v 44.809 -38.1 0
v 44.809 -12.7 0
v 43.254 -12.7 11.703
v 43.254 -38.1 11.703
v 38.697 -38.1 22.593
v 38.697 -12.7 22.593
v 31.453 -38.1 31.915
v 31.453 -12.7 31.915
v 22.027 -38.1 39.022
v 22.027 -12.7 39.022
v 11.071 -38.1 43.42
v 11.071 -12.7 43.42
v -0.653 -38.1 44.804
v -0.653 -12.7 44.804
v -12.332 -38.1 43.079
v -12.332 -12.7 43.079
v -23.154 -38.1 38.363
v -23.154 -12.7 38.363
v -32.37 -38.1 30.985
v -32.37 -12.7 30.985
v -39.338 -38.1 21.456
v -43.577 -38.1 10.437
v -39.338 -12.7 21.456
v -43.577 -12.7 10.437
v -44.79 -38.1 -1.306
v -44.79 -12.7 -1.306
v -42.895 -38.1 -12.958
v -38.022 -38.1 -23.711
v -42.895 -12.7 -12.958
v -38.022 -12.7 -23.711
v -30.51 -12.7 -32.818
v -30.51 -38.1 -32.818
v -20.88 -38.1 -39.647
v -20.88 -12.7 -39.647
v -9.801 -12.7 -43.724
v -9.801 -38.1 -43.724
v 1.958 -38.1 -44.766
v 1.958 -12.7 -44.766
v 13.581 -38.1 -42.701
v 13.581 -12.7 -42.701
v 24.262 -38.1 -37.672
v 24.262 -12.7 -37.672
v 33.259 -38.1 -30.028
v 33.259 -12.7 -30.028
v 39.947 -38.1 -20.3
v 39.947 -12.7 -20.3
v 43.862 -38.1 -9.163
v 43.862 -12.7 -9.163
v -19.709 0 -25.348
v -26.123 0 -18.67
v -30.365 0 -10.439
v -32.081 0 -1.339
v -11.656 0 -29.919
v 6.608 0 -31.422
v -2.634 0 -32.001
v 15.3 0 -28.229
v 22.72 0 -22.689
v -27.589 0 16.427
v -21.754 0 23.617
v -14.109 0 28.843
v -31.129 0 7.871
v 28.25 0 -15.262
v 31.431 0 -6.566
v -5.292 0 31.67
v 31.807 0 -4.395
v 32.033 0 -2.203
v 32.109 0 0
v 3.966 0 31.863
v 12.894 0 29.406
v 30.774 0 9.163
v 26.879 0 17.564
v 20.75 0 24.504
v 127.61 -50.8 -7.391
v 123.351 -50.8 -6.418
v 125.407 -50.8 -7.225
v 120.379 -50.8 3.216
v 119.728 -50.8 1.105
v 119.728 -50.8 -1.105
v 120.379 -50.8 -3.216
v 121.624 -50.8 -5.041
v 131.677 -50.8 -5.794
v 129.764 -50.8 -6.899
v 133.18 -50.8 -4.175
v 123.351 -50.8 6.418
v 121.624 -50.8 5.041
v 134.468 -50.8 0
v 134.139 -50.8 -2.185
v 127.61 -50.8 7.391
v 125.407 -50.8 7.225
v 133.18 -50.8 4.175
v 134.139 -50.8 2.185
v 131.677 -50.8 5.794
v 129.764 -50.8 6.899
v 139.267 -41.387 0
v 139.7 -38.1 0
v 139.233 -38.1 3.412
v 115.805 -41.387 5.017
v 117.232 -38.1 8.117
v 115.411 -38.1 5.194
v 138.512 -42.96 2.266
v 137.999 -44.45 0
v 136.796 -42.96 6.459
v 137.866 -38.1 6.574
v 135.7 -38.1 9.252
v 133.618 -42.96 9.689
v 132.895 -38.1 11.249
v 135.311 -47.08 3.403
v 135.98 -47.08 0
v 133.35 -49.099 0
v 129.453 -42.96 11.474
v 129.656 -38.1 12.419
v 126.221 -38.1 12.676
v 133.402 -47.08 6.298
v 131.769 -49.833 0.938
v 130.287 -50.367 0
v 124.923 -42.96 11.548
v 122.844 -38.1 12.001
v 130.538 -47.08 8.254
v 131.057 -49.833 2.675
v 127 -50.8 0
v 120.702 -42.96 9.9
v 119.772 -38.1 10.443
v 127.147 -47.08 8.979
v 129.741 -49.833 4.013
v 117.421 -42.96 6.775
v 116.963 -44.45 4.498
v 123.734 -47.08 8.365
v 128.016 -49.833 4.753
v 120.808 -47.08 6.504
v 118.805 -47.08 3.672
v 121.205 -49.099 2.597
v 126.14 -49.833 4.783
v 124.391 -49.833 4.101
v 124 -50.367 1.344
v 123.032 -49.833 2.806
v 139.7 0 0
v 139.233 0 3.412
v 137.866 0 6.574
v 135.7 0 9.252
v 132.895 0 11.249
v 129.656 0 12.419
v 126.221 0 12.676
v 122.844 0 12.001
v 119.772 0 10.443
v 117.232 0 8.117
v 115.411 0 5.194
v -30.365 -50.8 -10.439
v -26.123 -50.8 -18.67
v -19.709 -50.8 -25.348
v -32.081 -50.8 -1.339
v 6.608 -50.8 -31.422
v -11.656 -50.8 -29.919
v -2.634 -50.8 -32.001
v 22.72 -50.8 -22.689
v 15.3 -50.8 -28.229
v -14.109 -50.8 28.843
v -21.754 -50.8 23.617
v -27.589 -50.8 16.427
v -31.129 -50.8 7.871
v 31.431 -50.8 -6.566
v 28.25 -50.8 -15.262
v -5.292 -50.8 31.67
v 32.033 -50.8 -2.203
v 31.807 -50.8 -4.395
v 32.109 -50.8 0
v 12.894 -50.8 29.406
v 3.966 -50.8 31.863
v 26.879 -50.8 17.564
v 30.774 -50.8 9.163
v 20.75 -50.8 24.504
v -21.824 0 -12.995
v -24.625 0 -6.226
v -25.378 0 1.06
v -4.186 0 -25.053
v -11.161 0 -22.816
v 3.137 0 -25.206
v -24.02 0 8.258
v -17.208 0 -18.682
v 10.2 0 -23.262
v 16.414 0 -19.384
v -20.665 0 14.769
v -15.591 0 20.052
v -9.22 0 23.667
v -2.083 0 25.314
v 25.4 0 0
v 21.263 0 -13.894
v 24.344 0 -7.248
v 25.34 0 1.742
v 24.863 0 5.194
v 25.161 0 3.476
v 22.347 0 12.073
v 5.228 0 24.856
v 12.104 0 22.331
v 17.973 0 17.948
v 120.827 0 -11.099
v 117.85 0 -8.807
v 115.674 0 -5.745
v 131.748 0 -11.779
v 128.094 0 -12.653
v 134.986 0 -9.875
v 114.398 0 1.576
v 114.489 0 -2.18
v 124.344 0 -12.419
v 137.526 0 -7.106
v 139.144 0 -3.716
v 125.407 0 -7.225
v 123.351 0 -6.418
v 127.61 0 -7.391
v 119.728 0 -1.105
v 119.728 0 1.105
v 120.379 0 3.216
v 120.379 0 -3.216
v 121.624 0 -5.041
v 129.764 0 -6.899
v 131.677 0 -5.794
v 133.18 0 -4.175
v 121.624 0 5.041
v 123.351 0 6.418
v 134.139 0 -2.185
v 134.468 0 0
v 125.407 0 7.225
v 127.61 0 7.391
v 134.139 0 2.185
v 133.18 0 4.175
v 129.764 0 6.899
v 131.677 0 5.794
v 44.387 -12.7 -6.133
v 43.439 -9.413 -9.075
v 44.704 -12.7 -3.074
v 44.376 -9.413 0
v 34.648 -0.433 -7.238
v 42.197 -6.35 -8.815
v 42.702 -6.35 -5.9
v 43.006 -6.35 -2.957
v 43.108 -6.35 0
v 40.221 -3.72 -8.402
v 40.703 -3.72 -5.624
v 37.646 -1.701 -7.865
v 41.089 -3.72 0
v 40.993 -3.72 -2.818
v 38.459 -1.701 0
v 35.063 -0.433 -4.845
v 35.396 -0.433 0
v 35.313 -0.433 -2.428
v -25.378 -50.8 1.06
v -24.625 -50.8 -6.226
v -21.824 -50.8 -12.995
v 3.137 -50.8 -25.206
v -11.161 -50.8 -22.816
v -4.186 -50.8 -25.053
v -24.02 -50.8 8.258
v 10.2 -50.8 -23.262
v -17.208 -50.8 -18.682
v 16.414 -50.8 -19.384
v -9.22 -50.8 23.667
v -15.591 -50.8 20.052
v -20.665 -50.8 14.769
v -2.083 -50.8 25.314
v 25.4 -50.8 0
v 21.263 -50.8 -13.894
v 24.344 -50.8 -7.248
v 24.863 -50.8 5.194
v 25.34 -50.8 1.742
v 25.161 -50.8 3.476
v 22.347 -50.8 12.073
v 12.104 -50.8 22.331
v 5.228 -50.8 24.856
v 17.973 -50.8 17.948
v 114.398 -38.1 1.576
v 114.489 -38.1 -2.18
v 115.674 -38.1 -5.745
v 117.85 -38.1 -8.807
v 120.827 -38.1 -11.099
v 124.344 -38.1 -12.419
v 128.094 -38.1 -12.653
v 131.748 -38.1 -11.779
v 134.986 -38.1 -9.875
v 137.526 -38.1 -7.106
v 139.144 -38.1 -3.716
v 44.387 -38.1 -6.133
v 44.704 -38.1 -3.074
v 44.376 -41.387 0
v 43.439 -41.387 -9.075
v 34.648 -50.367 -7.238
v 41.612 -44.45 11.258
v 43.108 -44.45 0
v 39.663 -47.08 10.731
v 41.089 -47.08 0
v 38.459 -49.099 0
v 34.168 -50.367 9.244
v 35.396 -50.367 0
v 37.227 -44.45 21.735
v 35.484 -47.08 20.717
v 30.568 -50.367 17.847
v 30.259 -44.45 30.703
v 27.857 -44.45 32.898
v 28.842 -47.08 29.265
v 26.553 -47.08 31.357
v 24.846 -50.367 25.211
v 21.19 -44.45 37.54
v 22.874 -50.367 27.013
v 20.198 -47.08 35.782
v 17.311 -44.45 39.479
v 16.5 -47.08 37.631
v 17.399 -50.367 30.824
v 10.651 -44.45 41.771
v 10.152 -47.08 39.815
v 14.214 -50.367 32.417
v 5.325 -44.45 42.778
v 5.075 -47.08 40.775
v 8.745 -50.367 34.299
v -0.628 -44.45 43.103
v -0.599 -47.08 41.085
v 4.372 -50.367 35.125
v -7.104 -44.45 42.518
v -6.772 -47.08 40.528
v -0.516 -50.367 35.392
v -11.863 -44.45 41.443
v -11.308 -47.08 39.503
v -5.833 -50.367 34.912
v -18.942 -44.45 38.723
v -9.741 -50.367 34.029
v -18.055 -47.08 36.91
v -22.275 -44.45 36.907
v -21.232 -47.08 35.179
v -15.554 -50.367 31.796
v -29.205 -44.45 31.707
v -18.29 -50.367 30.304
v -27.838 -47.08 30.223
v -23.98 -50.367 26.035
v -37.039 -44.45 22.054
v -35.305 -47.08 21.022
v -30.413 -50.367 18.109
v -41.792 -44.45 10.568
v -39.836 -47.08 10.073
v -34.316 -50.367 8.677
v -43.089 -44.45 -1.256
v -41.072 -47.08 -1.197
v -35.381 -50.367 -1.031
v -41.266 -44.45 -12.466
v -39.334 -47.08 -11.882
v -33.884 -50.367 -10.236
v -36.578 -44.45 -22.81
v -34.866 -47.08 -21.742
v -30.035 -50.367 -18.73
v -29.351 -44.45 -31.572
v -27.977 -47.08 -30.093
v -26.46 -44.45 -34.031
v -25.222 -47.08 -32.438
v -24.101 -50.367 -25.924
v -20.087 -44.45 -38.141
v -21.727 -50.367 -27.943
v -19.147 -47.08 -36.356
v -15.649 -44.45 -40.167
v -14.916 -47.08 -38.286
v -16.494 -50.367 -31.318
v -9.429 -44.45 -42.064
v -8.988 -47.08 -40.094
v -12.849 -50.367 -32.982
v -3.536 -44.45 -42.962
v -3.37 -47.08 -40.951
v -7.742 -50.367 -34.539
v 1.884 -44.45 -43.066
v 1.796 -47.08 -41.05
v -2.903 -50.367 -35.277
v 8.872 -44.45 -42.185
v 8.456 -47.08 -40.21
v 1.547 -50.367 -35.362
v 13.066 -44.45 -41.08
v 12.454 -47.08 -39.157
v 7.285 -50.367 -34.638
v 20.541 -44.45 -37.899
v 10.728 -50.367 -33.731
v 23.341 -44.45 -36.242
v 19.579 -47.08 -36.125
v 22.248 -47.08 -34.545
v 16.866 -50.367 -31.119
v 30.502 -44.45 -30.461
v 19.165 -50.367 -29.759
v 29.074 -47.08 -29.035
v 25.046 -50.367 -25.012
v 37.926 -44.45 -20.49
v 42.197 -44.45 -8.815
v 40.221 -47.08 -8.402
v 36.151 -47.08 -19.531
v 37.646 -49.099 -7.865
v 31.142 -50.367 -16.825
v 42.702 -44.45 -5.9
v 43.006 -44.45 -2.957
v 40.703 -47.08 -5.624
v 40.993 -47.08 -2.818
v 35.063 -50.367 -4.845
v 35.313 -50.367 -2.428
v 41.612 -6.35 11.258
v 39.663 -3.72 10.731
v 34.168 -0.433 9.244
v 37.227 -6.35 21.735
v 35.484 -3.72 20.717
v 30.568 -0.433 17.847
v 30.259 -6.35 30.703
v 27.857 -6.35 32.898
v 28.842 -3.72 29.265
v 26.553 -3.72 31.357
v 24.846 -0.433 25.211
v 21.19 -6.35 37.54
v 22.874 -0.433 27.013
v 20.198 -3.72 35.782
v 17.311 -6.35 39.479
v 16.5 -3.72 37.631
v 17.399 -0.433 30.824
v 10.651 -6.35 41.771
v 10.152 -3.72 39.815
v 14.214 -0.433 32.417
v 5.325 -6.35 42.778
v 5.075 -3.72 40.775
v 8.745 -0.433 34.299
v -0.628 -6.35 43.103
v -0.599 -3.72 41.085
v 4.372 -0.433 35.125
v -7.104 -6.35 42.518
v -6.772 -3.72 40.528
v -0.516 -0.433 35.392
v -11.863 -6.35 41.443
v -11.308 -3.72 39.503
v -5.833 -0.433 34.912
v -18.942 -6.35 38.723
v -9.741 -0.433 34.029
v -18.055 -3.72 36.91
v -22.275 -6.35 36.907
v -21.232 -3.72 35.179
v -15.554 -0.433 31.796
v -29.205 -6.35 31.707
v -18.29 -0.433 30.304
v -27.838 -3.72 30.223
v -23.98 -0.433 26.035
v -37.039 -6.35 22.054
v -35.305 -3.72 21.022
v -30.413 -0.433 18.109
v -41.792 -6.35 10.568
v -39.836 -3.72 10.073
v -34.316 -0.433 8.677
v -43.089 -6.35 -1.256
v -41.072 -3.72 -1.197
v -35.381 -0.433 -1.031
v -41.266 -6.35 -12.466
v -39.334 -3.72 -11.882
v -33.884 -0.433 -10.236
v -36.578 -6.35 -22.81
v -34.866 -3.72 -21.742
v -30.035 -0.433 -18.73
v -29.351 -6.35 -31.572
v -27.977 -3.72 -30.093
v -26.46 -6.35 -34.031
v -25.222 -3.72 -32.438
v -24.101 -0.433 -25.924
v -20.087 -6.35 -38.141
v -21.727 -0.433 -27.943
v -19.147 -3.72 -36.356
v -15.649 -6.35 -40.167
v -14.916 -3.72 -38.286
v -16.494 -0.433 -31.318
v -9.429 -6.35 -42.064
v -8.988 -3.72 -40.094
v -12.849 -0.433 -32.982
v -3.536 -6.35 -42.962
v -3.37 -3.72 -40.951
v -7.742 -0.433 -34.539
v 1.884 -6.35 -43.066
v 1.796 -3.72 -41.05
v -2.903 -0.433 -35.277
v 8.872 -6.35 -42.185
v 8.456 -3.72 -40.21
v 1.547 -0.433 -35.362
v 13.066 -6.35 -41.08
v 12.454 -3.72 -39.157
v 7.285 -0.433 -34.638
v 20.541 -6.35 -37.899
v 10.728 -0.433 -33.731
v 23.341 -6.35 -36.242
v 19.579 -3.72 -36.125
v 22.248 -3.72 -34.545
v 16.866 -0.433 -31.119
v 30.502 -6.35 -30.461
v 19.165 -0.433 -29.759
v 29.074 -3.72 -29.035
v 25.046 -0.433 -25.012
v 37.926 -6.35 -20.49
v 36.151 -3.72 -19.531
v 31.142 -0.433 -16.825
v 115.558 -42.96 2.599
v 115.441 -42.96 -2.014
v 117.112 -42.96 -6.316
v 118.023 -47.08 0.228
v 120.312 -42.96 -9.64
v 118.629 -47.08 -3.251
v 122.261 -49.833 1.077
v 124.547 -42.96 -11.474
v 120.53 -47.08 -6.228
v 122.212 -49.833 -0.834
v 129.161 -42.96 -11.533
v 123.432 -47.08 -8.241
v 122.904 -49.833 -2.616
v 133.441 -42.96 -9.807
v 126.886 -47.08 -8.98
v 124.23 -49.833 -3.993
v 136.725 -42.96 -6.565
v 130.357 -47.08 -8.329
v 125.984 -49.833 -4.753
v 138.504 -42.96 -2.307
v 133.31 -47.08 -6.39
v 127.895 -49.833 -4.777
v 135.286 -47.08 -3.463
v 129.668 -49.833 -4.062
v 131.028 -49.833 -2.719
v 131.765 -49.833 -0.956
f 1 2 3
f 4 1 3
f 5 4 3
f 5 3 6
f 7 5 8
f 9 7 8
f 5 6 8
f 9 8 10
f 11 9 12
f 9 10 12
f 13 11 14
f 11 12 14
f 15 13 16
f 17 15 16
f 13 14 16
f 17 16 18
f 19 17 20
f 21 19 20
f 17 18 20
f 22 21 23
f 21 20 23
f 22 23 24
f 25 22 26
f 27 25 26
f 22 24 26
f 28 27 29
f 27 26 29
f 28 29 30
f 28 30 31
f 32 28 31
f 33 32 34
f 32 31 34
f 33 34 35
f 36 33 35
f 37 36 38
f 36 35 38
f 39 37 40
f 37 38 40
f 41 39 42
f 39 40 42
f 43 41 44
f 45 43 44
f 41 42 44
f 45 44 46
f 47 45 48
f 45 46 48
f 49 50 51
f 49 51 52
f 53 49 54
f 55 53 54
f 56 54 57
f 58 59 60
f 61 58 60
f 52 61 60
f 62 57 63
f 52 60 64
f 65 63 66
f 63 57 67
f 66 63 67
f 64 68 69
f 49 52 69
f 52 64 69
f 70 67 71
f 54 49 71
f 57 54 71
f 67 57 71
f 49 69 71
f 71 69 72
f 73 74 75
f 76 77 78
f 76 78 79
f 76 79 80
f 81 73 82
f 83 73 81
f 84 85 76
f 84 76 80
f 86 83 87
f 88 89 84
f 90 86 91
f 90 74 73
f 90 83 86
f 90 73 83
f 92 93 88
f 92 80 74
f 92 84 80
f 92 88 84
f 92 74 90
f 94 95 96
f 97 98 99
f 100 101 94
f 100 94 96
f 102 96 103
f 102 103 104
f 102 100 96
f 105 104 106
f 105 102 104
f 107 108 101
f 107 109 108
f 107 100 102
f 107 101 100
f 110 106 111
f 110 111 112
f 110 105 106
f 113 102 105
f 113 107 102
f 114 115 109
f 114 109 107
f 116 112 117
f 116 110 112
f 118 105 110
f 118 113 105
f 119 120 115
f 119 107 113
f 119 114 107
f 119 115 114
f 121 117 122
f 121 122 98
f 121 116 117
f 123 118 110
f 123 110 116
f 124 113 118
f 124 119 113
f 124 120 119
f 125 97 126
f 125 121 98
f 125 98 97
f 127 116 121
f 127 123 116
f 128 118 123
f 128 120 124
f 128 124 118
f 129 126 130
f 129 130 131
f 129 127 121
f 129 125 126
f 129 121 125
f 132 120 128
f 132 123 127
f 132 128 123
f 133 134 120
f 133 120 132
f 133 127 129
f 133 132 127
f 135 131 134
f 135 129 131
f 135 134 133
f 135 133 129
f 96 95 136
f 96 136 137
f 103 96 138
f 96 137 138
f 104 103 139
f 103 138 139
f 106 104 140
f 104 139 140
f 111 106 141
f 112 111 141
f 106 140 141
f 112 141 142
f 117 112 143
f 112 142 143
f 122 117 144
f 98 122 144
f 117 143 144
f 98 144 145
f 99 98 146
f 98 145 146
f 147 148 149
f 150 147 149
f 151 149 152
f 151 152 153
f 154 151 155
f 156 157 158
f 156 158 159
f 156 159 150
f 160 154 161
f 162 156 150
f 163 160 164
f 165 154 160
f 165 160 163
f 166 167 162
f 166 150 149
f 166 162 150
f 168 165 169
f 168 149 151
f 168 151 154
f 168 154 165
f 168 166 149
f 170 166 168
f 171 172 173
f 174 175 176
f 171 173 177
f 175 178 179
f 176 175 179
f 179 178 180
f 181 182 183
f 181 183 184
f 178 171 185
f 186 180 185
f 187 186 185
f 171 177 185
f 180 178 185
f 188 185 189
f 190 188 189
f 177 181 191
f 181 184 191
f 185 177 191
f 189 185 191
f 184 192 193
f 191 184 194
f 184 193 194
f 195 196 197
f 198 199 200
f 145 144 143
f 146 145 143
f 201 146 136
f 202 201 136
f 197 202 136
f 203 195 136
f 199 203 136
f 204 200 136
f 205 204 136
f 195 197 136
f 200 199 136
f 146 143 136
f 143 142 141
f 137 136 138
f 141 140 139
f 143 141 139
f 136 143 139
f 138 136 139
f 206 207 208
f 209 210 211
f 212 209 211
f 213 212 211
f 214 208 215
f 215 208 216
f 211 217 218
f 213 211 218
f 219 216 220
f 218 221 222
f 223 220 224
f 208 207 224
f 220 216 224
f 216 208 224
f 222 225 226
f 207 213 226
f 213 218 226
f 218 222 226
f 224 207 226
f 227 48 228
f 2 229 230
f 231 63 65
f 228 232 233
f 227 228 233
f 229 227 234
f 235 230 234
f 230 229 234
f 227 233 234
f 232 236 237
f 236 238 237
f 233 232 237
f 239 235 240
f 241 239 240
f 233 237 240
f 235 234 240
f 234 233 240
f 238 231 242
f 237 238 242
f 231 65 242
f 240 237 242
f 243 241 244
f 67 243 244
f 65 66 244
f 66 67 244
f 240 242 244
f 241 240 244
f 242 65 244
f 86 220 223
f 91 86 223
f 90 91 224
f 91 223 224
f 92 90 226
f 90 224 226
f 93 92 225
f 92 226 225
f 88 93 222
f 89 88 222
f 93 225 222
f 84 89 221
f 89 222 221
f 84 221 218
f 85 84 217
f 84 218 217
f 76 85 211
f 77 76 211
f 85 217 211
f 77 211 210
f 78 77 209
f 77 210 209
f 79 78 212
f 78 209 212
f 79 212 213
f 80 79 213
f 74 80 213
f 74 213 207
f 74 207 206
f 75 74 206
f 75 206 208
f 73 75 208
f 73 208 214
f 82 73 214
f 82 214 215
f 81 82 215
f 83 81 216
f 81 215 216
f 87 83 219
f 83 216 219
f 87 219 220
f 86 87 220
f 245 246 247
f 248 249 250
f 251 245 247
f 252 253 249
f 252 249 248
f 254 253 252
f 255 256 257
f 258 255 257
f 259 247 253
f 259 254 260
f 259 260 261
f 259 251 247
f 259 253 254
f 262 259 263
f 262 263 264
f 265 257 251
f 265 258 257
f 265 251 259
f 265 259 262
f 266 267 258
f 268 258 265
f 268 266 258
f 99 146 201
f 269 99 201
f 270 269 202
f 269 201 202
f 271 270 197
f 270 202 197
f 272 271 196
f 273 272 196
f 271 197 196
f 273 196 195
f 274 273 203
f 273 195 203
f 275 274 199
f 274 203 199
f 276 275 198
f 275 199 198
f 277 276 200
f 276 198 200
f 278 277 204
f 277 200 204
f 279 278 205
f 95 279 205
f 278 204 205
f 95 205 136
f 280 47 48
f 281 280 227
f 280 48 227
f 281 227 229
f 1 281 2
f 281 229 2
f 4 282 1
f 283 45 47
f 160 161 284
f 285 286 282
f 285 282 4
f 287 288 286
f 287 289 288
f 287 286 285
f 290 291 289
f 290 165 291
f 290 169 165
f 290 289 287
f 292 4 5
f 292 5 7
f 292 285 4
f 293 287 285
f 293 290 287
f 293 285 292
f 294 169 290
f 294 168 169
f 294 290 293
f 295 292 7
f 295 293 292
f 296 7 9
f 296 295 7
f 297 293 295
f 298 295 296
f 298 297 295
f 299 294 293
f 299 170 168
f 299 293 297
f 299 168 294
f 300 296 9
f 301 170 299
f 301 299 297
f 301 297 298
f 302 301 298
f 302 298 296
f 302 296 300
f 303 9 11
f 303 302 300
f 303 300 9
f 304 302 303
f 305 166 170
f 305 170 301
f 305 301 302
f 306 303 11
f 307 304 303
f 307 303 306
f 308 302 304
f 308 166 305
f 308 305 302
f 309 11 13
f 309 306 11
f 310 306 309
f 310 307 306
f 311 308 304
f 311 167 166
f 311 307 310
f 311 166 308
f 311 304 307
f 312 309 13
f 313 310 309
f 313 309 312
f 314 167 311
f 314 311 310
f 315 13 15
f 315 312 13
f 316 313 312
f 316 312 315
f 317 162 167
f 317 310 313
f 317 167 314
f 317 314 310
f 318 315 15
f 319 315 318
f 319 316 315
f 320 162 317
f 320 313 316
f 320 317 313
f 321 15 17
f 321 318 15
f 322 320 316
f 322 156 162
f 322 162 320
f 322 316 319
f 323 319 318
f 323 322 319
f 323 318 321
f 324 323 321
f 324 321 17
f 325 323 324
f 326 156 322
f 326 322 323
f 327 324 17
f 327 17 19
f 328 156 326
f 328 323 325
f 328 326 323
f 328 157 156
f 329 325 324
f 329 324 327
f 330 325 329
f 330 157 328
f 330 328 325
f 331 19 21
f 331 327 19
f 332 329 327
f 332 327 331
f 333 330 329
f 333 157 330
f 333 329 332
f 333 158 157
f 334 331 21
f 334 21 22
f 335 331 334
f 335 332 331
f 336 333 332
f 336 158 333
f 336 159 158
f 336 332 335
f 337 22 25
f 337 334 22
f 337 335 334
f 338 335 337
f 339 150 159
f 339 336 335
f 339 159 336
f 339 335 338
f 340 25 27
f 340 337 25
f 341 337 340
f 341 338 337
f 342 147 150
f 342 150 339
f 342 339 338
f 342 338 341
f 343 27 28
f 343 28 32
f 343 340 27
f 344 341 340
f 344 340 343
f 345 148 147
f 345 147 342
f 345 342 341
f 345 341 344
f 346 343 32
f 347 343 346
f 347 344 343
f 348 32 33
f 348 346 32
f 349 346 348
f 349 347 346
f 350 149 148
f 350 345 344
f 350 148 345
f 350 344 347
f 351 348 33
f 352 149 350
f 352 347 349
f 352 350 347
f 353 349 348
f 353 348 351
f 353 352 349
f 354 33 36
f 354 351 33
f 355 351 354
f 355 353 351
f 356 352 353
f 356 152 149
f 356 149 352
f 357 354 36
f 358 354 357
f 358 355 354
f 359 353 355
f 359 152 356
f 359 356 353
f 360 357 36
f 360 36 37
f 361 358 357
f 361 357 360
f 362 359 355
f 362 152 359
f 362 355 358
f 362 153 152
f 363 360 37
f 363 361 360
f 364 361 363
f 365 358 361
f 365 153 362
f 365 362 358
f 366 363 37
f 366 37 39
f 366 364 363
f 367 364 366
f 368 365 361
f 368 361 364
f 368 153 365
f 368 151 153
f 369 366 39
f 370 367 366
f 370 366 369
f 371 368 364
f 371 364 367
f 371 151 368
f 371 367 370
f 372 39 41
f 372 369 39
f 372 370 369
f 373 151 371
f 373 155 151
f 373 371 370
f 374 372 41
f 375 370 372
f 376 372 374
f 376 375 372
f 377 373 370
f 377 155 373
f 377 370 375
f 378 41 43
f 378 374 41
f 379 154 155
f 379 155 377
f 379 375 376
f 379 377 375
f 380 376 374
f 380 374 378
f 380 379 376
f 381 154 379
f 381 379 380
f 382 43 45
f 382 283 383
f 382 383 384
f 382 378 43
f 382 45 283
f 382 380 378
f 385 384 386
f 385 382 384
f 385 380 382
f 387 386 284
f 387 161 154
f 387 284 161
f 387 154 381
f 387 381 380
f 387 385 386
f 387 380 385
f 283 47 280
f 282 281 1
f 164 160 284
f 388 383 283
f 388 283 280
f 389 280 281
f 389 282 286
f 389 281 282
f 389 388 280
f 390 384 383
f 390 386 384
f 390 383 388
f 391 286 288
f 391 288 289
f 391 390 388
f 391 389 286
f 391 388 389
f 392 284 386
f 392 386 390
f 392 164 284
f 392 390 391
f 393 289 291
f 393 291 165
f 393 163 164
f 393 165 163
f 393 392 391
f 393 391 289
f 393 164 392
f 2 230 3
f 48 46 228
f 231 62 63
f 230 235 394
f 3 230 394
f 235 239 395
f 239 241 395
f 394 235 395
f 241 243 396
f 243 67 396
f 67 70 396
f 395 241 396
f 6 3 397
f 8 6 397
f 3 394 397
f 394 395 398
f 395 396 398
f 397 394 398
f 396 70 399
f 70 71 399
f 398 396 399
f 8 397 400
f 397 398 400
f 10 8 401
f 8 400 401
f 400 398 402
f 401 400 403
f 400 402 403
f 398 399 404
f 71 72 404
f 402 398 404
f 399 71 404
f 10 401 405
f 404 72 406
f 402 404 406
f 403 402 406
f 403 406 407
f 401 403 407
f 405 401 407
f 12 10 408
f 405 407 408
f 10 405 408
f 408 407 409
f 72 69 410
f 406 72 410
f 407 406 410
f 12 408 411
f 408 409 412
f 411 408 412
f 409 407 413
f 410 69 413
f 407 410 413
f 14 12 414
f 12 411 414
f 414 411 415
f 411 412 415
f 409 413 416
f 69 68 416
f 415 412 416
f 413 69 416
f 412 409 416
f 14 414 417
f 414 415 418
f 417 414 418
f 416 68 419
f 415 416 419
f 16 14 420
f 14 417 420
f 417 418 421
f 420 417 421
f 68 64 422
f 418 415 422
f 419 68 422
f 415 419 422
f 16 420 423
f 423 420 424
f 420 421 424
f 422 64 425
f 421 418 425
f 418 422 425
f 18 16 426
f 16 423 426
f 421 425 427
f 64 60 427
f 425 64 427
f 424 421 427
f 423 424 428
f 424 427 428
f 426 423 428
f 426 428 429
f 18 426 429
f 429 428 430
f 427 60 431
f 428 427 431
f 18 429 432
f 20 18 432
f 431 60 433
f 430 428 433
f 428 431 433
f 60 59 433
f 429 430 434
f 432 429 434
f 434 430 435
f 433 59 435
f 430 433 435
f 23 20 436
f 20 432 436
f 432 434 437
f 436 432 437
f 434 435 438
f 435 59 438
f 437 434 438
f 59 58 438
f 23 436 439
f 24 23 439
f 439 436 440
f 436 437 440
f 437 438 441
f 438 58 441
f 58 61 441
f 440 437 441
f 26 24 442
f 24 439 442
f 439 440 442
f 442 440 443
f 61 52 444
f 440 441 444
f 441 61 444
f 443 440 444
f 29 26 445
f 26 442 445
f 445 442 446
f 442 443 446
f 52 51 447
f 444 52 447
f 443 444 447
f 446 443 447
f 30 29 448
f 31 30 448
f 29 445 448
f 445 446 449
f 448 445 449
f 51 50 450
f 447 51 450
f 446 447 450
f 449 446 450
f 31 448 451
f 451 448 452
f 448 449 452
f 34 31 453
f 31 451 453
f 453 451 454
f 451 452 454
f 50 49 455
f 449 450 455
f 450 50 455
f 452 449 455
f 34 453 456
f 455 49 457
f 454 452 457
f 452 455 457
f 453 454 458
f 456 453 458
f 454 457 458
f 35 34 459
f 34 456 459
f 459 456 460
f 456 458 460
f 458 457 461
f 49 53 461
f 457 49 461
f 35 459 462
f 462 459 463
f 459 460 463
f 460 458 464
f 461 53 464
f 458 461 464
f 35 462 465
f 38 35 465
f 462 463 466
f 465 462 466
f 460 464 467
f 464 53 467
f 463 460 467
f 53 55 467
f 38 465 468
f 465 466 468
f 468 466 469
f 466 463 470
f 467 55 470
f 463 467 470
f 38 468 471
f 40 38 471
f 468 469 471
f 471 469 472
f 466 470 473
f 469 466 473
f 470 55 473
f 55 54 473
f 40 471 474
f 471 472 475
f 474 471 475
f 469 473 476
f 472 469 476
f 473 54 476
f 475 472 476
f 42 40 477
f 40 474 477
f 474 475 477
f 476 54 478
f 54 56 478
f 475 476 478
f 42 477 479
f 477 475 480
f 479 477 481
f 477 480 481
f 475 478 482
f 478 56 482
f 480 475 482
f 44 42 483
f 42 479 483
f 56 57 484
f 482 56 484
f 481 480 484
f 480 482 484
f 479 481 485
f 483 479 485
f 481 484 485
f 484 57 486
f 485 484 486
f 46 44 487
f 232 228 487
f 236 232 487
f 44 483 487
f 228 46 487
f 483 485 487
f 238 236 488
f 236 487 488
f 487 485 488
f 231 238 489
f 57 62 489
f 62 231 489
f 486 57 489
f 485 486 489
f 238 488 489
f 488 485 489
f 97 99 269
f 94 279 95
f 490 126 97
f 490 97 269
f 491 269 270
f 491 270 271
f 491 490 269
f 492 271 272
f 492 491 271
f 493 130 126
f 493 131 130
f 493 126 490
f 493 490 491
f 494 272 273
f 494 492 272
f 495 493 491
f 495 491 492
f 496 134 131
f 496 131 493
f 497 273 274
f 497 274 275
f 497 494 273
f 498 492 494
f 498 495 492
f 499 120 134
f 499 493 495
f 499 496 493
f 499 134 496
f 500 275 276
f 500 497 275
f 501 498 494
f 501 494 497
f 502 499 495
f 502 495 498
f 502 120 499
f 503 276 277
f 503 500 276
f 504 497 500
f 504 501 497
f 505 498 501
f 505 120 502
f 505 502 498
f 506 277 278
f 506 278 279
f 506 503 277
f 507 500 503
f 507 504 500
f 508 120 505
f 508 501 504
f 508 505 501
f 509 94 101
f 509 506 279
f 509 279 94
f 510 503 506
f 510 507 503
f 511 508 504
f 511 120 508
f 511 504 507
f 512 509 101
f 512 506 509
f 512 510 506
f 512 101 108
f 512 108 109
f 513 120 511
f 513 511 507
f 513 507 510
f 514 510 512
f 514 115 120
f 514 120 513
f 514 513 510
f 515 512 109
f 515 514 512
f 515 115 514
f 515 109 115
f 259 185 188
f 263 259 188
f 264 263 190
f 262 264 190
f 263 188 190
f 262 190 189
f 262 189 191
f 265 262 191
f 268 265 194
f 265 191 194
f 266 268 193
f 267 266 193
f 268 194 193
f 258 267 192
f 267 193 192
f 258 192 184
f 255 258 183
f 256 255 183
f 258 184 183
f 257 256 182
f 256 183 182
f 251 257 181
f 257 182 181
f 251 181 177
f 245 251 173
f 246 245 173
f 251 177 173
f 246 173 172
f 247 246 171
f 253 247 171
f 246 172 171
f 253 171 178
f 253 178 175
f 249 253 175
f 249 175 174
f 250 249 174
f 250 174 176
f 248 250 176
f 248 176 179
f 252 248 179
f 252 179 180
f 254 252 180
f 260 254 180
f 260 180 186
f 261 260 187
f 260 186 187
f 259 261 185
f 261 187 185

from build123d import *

# Parameters (mm, degrees)
F2_DEPTH = 50.8
F1_R     = 7.41128256
F3_R     = 12.7
F4_R     = 12.7


with BuildPart() as f2:
    # F0 (on Front) → F2 (new body)
    with BuildSketch(Plane.XZ):
        with BuildLine():
            ThreePointArc((24.8633552195, 5.1936083051), (-25.2654826055, -2.6106299454), (25.4, 0))
            ThreePointArc((25.4, 0), (25.2654826055, 2.6106299454), (24.8633552195, 5.1936083051))
        make_face()
    extrude(amount=F2_DEPTH)


with BuildPart() as f2b:
    # F0 (on Front) → F2, piece 2 (new body)
    with BuildSketch(Plane.XZ):
        with BuildLine():
            ThreePointArc((139.7, 0), (129.6555030079, 12.4192714672), (115.4105033425, 5.1936083051))
            ThreePointArc((115.4105033425, 5.1936083051), (124.3444969921, -12.4192714672), (139.7, 0))
        make_face()
    extrude(amount=F2_DEPTH)

    # F4
    f4_edges = [f2b.edges().sort_by_distance(p)[0] for p in [
        (114.3, -50.8, 0),
    ]]
    fillet(f4_edges, radius=F4_R)


with BuildPart() as f2c:
    # F1 (on face) → F2, piece 3 (new body)
    with BuildSketch(Plane.XZ):
        with BuildLine():
            ThreePointArc((43.862228163, -9.1630918905), (44.5717690666, -4.6059434098), (44.8091208619, 0))
            ThreePointArc((44.8091208619, 0), (-44.5717690666, 4.6059434098), (43.862228163, -9.1630918905))
        make_face()
    extrude(amount=F2_DEPTH)

    # F3
    f3_edges = [f2c.edges().sort_by_distance(p)[0] for p in [
        (-43.862228, -50.8, 9.163092),
        (-43.862228, 0, 9.163092),
    ]]
    fillet(f3_edges, radius=F3_R)


with BuildPart() as f2d:
    # F1 (on face) → F2, piece 4 (new body)
    with BuildSketch(Plane.XZ):
        with Locations((127.0564943552, 0)):
            Circle(F1_R)
    extrude(amount=F2_DEPTH)


solid = Compound([f2.part, f2b.part, f2c.part, f2d.part])
